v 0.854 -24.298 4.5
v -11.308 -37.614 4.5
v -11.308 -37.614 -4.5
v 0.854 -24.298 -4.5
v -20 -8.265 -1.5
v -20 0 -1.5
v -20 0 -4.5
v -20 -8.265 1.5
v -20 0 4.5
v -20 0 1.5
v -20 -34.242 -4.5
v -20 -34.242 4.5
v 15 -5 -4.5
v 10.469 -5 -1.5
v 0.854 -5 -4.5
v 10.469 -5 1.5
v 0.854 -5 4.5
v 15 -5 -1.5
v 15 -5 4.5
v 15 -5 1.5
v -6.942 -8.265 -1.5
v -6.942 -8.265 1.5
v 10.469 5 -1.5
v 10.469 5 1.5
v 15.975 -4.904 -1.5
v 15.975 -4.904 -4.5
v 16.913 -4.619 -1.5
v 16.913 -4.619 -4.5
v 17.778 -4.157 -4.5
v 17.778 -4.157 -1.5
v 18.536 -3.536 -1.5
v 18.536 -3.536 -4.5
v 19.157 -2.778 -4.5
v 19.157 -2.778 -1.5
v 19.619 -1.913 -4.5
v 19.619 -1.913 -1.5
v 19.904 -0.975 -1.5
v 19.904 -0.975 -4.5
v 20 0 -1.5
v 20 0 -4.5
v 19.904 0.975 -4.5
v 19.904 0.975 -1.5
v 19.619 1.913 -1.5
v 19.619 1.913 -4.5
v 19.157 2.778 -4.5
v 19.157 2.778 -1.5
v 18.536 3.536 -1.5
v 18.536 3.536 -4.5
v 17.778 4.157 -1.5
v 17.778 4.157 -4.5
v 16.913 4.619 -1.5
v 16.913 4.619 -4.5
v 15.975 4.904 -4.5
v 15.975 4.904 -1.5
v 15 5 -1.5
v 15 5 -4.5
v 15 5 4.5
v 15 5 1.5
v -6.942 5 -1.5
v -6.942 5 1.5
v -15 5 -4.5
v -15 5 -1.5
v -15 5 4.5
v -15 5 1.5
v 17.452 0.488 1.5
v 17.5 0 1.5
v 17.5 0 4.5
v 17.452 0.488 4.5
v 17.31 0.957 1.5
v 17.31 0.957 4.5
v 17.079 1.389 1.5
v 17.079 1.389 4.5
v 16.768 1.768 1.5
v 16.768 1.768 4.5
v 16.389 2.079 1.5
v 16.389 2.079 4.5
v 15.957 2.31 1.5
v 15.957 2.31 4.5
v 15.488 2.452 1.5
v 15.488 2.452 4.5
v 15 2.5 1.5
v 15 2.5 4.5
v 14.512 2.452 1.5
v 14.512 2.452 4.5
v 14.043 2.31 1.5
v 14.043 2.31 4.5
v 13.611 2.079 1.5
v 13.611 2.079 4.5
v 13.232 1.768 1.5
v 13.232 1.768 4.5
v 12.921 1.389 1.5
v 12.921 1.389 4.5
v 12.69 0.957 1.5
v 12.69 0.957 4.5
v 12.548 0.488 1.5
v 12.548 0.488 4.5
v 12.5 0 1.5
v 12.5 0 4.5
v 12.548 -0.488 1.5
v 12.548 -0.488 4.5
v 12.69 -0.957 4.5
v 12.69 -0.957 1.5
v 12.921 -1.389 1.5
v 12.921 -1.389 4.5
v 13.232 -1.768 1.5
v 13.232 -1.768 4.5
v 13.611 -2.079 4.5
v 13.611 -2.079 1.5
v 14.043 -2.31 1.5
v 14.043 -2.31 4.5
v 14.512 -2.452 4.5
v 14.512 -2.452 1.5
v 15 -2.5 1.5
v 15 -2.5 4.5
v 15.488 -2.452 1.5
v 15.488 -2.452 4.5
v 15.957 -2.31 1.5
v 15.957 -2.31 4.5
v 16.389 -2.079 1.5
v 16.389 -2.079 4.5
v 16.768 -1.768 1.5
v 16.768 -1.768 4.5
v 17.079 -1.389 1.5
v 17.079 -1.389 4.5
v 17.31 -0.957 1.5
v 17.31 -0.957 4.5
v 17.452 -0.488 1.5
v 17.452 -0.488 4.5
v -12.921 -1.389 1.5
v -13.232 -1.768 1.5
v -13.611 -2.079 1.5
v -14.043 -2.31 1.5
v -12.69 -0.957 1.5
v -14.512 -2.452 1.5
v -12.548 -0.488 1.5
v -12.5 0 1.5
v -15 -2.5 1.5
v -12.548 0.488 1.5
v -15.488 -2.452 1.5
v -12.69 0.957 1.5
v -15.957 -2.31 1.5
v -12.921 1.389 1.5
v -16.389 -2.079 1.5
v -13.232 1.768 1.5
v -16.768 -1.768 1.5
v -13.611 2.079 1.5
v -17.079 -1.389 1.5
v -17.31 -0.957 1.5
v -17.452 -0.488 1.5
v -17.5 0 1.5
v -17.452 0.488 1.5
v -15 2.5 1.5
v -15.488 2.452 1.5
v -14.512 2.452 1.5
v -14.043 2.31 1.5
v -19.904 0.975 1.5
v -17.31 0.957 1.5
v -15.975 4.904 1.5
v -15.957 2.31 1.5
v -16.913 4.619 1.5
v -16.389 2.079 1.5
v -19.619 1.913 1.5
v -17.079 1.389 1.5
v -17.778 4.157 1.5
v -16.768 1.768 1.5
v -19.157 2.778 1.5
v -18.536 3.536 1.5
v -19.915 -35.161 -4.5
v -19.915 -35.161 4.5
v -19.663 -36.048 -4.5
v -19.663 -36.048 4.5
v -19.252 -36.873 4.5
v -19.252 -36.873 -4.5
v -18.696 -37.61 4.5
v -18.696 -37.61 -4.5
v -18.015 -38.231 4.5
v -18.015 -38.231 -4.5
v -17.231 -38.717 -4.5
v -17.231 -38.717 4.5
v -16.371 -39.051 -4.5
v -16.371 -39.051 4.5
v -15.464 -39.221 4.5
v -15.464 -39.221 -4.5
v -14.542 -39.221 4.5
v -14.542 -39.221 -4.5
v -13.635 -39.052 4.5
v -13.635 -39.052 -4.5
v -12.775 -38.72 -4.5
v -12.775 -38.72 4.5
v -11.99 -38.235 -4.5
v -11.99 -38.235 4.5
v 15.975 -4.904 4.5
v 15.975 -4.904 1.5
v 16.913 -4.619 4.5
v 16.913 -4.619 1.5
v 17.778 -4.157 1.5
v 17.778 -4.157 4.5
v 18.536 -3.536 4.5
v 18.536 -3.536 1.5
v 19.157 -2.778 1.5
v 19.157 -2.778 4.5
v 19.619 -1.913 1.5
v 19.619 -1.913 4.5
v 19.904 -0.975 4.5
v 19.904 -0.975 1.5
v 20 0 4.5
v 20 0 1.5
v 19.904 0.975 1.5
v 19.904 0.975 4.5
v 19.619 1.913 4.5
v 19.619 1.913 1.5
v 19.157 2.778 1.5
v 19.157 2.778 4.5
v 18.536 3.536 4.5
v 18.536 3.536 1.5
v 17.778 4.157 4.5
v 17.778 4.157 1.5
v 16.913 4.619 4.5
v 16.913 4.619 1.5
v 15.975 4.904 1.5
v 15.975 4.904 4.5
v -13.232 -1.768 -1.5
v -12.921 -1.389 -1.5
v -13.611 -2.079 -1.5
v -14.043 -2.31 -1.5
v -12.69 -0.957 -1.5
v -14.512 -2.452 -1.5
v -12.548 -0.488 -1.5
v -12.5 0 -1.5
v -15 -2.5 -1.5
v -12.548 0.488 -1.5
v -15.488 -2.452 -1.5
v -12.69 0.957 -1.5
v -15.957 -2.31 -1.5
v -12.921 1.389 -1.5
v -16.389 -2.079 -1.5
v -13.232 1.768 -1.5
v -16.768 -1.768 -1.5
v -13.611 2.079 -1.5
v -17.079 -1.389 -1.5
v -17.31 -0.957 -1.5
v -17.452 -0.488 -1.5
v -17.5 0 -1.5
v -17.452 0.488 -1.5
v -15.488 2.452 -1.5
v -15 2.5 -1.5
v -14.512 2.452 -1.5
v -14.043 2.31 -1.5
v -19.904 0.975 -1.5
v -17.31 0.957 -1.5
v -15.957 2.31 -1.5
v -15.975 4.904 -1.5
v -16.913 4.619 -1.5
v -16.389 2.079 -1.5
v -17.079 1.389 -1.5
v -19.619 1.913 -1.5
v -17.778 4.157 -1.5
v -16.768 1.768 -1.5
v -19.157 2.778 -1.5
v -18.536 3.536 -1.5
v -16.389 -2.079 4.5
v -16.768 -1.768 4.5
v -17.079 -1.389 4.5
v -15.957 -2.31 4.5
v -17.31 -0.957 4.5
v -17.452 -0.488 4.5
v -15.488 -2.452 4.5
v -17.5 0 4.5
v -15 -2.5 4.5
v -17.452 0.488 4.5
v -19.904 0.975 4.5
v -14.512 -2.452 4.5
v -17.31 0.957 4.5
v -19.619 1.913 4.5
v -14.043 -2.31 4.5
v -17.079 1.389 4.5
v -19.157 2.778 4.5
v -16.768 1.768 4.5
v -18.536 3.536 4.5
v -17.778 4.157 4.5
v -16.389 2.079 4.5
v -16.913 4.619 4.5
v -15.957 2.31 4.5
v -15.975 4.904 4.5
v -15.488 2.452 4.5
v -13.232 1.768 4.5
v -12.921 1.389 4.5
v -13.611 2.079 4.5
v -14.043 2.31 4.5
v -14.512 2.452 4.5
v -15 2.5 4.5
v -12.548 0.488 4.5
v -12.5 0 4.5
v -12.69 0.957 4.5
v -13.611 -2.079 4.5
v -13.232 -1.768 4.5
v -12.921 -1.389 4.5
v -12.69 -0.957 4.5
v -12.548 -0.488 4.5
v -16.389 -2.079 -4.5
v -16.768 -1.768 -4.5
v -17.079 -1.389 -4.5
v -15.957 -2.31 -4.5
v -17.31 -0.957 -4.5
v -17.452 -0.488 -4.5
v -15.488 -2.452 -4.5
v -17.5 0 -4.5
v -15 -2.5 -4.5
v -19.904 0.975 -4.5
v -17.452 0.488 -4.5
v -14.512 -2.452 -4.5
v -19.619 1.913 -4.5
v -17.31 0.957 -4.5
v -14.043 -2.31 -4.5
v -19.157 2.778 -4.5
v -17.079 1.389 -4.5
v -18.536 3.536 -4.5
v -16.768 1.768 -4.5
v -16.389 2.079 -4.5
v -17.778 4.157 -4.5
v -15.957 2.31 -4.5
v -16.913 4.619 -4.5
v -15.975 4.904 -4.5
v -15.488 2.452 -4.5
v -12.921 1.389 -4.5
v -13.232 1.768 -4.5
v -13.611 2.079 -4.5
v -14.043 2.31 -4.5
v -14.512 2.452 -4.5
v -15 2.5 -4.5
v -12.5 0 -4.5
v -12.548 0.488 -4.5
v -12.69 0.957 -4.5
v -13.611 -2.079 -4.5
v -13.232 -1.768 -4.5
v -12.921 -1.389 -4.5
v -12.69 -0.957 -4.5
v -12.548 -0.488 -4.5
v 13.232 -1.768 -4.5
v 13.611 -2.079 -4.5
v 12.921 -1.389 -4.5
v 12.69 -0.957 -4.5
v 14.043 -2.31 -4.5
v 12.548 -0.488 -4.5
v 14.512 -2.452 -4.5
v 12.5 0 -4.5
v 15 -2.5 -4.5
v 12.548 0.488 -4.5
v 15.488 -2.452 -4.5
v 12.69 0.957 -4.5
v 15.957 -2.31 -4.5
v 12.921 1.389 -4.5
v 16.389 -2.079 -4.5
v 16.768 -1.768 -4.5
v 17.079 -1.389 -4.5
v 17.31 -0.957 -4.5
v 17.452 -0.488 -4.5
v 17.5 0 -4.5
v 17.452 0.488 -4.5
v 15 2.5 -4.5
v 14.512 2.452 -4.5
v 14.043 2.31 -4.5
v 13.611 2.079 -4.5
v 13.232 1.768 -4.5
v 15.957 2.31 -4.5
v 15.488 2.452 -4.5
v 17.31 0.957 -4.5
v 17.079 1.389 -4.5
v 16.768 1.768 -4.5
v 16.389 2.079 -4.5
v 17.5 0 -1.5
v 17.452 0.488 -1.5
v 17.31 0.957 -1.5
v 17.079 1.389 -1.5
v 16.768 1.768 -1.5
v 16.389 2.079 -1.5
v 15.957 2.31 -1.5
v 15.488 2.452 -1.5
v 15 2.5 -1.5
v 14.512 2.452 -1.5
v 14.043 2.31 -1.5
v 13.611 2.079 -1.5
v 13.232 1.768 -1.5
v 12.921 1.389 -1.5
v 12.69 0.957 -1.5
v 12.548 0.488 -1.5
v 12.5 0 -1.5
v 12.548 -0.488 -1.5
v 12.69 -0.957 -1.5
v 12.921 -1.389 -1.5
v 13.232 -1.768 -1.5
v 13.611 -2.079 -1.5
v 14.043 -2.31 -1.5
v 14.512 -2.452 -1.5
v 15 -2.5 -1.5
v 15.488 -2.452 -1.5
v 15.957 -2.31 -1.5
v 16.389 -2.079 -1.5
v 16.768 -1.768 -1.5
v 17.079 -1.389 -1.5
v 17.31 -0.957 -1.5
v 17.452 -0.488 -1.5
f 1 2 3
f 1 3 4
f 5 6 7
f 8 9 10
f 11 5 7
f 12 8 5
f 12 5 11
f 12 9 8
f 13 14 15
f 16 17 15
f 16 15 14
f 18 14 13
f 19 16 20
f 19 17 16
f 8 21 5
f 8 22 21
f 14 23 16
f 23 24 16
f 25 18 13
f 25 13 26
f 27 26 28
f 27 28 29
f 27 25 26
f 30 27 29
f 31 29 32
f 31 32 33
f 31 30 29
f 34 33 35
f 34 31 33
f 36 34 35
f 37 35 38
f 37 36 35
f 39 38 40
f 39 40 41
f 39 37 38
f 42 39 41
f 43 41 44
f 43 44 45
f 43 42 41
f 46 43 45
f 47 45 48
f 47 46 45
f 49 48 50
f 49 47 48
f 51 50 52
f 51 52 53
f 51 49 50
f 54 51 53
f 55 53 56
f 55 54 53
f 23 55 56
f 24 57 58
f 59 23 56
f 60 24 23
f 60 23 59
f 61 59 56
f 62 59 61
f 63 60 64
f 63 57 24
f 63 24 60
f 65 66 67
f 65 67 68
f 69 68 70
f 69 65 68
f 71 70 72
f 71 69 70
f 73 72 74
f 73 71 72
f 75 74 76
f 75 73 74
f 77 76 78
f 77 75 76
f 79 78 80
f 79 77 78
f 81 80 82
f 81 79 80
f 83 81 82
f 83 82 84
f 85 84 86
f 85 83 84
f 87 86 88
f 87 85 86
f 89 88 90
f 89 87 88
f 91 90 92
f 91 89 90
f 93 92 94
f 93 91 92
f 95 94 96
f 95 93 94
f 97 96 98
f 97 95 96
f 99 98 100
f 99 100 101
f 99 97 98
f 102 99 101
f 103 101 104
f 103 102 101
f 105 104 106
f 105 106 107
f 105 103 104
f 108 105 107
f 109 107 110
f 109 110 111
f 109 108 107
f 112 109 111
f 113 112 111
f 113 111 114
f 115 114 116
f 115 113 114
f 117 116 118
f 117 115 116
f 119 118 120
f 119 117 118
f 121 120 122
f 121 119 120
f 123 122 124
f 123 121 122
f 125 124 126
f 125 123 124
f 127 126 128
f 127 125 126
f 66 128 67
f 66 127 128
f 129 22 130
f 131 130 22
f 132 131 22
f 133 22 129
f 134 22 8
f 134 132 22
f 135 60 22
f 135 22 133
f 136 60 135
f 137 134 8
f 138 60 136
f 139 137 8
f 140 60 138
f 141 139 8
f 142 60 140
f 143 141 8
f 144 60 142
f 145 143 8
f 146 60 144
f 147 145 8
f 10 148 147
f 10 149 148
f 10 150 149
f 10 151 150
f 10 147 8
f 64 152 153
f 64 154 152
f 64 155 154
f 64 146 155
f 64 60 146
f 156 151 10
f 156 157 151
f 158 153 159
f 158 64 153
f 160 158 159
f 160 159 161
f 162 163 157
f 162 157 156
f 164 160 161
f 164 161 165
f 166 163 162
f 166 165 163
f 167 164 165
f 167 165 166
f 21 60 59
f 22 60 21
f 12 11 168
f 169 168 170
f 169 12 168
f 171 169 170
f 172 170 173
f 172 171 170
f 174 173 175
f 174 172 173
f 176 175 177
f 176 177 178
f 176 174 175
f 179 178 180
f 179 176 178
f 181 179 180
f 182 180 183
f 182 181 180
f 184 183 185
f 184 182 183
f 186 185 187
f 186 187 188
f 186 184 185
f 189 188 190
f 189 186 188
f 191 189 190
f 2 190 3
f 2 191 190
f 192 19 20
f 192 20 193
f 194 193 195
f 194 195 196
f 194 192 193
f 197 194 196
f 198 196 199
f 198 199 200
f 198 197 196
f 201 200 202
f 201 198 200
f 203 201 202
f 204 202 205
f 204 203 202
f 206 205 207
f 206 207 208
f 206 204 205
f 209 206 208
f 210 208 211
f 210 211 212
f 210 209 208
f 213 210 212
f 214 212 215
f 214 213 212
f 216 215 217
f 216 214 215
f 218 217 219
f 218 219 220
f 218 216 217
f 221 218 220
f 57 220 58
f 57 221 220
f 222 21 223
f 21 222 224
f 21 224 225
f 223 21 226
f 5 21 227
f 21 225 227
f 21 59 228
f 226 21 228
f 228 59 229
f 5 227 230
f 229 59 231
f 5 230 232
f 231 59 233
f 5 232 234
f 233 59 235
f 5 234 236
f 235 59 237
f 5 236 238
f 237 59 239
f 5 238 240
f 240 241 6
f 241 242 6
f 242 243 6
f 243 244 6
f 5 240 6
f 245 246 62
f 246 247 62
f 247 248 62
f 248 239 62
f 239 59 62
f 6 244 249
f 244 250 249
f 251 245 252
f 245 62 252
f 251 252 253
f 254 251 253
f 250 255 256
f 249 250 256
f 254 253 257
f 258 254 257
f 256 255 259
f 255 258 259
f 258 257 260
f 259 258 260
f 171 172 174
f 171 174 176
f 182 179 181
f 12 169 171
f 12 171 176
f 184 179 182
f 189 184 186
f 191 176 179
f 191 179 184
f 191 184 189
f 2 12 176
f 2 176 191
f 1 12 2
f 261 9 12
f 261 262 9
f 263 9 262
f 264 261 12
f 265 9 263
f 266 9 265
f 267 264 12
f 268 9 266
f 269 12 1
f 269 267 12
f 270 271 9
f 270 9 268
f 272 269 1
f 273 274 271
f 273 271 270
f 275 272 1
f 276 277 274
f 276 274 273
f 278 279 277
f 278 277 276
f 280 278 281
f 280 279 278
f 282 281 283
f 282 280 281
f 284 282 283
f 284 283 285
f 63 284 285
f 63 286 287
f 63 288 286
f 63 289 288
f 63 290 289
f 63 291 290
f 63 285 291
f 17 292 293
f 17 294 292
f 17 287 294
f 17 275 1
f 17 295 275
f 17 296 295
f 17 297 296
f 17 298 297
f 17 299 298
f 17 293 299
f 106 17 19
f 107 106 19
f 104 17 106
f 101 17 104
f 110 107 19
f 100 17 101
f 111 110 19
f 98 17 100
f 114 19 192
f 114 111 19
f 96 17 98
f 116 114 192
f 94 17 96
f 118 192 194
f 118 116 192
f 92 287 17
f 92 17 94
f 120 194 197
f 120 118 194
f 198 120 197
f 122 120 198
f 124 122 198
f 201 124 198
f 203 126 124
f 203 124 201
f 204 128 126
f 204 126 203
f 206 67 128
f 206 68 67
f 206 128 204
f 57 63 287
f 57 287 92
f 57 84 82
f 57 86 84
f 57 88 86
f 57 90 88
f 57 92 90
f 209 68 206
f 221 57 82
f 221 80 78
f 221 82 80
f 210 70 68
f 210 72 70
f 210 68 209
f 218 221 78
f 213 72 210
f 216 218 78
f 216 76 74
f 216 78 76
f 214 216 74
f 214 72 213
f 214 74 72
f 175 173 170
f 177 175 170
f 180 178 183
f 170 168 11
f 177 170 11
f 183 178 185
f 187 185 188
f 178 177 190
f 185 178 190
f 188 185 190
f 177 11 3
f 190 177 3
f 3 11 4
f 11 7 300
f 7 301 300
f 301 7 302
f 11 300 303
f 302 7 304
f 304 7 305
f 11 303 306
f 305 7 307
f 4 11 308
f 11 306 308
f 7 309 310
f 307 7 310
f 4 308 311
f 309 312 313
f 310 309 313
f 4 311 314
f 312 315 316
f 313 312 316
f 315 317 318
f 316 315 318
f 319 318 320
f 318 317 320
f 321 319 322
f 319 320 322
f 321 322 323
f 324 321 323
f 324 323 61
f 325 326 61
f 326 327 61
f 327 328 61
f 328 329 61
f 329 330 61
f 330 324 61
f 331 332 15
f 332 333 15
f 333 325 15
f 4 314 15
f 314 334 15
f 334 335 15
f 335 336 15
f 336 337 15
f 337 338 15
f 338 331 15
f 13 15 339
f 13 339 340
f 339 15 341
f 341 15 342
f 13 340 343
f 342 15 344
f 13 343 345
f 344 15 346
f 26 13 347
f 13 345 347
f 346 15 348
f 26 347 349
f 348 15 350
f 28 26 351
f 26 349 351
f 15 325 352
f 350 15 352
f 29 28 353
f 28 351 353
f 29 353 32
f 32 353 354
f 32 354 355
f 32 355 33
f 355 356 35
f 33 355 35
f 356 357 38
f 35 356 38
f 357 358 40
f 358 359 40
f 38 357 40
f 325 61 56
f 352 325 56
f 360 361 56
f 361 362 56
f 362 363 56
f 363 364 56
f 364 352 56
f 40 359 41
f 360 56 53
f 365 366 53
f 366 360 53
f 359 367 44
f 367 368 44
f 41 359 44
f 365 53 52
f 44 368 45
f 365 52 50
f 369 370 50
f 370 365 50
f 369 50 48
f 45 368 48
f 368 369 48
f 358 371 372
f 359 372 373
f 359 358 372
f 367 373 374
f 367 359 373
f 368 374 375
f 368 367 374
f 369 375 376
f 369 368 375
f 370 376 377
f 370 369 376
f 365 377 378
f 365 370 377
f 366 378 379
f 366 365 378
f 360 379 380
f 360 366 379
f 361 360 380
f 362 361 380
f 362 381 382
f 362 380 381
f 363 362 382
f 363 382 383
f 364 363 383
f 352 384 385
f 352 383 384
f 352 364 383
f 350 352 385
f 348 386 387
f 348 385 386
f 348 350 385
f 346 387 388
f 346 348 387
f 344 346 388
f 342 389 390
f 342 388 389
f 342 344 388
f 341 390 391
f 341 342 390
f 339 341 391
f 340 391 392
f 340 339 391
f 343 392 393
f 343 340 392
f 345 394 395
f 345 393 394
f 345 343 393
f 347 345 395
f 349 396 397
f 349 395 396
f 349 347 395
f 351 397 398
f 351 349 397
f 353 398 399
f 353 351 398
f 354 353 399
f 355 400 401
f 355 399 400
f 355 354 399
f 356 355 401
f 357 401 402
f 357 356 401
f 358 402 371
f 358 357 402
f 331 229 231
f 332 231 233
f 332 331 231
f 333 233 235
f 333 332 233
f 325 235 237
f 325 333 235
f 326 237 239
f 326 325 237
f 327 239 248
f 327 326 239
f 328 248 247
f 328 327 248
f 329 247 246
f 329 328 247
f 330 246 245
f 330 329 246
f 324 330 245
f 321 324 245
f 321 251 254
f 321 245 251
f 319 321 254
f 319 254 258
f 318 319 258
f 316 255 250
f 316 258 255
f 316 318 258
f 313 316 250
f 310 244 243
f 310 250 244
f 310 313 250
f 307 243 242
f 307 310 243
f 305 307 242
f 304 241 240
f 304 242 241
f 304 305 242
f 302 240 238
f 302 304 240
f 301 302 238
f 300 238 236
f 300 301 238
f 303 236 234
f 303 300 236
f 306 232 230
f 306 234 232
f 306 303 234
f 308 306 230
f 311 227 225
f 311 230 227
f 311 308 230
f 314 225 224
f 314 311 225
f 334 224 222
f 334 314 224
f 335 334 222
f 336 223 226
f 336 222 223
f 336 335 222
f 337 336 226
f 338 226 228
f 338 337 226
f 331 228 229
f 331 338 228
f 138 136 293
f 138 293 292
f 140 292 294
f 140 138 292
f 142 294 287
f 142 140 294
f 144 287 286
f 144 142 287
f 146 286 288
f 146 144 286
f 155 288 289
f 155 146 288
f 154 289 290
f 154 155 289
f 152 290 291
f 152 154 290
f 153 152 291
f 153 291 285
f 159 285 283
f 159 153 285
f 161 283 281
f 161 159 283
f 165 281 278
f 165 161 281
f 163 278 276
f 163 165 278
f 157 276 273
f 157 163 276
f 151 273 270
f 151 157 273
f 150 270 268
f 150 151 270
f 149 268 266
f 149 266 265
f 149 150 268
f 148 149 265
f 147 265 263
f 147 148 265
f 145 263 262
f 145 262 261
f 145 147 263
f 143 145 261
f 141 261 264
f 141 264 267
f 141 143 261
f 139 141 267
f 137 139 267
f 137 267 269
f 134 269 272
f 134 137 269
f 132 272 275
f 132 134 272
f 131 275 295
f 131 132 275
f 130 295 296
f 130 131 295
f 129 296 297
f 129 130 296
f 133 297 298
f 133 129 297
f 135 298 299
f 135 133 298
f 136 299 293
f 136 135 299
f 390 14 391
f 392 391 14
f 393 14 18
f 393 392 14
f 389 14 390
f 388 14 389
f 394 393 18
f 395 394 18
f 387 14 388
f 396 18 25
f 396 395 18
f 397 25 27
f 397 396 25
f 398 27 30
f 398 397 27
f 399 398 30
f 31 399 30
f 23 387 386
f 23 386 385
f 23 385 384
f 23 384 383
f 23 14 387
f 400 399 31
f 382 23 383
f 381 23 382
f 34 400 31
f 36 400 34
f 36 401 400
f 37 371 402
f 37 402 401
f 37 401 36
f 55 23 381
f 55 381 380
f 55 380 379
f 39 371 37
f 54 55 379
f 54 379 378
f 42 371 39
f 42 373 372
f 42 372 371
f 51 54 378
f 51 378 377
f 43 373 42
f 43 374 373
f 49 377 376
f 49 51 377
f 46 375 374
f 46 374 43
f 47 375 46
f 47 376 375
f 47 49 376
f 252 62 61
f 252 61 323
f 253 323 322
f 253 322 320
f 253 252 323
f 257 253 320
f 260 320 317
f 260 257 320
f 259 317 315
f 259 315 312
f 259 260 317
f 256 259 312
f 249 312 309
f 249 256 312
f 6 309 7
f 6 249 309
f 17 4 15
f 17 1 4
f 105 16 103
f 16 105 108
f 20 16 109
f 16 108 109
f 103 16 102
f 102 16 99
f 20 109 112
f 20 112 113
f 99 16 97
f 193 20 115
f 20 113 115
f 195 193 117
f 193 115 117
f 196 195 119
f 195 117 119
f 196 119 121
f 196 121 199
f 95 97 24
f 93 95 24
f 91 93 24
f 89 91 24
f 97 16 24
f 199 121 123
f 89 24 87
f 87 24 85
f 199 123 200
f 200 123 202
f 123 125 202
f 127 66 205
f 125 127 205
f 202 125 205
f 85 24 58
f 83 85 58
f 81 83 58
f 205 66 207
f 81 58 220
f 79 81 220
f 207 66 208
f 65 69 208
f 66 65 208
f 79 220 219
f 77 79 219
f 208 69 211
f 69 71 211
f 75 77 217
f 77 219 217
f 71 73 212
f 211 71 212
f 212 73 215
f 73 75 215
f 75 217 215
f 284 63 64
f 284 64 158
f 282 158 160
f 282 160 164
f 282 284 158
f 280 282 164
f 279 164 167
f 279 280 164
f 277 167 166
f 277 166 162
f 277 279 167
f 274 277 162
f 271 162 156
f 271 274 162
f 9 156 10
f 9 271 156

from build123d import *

# Parameters (mm, degrees)
SKETCH1_R           = 2.5
BOSS_EXTRUDE1_DEPTH = 4.5
CUT_EXTRUDE1_DEPTH  = 1.5
CUT_EXTRUDE2_DEPTH  = 1.5
CUT_EXTRUDE3_DEPTH  = 1.5


with BuildPart() as part:
    # Sketch1 → Boss-Extrude1 (new, symmetric)
    with BuildSketch(Plane.XY):
        with BuildLine():
            Line((15, 5), (-15, 5))
            ThreePointArc((-15, 5), (-18.535533906, 3.535533906), (-20, 0))
            Line((-20, 0), (-20, -34.242134344))
            ThreePointArc((-20, -34.242134344), (-16.808430712, -38.903633927), (-11.308168657, -37.614133948))
            Line((-11.308168657, -37.614133948), (0.85432415, -24.298037441))
            Line((0.85432415, -24.298037441), (0.85432415, -5))
            Line((0.85432415, -5), (15, -5))
            ThreePointArc((15, -5), (20, 0), (15, 5))
        make_face()
        with Locations((-15, 0)):
            Circle(SKETCH1_R, mode=Mode.SUBTRACT)
        with Locations((15, 0)):
            Circle(SKETCH1_R, mode=Mode.SUBTRACT)
    extrude(amount=BOSS_EXTRUDE1_DEPTH, both=True)

    # Sketch2 → Cut-Extrude1 (cut, symmetric)
    with BuildSketch(Plane.XY):
        Polygon((-15, 5), (-6.942314992, 5), (-6.942314992, -8.265165355), (-20, -8.265165355), (-20, 0), align=None)
    extrude(amount=CUT_EXTRUDE1_DEPTH, both=True, mode=Mode.SUBTRACT)

    # Sketch4 → Cut-Extrude2 (cut, symmetric)
    with BuildSketch(Plane.XY):
        with BuildLine():
            Line((-20, 0), (-15, 5))
            ThreePointArc((-15, 5), (-18.535533906, 3.535533906), (-20, 0))
        make_face()
    extrude(amount=CUT_EXTRUDE2_DEPTH, both=True, mode=Mode.SUBTRACT)

    # Sketch5 → Cut-Extrude3 (cut, symmetric)
    with BuildSketch(Plane.XY):
        with BuildLine():
            Line((10.468699528, 5), (10.468699528, -5))
            Line((10.468699528, -5), (15, -5))
            ThreePointArc((15, -5), (20, 0), (15, 5))
            Line((15, 5), (10.468699528, 5))
        make_face()
    extrude(amount=CUT_EXTRUDE3_DEPTH, both=True, mode=Mode.SUBTRACT)


solid = part.part
